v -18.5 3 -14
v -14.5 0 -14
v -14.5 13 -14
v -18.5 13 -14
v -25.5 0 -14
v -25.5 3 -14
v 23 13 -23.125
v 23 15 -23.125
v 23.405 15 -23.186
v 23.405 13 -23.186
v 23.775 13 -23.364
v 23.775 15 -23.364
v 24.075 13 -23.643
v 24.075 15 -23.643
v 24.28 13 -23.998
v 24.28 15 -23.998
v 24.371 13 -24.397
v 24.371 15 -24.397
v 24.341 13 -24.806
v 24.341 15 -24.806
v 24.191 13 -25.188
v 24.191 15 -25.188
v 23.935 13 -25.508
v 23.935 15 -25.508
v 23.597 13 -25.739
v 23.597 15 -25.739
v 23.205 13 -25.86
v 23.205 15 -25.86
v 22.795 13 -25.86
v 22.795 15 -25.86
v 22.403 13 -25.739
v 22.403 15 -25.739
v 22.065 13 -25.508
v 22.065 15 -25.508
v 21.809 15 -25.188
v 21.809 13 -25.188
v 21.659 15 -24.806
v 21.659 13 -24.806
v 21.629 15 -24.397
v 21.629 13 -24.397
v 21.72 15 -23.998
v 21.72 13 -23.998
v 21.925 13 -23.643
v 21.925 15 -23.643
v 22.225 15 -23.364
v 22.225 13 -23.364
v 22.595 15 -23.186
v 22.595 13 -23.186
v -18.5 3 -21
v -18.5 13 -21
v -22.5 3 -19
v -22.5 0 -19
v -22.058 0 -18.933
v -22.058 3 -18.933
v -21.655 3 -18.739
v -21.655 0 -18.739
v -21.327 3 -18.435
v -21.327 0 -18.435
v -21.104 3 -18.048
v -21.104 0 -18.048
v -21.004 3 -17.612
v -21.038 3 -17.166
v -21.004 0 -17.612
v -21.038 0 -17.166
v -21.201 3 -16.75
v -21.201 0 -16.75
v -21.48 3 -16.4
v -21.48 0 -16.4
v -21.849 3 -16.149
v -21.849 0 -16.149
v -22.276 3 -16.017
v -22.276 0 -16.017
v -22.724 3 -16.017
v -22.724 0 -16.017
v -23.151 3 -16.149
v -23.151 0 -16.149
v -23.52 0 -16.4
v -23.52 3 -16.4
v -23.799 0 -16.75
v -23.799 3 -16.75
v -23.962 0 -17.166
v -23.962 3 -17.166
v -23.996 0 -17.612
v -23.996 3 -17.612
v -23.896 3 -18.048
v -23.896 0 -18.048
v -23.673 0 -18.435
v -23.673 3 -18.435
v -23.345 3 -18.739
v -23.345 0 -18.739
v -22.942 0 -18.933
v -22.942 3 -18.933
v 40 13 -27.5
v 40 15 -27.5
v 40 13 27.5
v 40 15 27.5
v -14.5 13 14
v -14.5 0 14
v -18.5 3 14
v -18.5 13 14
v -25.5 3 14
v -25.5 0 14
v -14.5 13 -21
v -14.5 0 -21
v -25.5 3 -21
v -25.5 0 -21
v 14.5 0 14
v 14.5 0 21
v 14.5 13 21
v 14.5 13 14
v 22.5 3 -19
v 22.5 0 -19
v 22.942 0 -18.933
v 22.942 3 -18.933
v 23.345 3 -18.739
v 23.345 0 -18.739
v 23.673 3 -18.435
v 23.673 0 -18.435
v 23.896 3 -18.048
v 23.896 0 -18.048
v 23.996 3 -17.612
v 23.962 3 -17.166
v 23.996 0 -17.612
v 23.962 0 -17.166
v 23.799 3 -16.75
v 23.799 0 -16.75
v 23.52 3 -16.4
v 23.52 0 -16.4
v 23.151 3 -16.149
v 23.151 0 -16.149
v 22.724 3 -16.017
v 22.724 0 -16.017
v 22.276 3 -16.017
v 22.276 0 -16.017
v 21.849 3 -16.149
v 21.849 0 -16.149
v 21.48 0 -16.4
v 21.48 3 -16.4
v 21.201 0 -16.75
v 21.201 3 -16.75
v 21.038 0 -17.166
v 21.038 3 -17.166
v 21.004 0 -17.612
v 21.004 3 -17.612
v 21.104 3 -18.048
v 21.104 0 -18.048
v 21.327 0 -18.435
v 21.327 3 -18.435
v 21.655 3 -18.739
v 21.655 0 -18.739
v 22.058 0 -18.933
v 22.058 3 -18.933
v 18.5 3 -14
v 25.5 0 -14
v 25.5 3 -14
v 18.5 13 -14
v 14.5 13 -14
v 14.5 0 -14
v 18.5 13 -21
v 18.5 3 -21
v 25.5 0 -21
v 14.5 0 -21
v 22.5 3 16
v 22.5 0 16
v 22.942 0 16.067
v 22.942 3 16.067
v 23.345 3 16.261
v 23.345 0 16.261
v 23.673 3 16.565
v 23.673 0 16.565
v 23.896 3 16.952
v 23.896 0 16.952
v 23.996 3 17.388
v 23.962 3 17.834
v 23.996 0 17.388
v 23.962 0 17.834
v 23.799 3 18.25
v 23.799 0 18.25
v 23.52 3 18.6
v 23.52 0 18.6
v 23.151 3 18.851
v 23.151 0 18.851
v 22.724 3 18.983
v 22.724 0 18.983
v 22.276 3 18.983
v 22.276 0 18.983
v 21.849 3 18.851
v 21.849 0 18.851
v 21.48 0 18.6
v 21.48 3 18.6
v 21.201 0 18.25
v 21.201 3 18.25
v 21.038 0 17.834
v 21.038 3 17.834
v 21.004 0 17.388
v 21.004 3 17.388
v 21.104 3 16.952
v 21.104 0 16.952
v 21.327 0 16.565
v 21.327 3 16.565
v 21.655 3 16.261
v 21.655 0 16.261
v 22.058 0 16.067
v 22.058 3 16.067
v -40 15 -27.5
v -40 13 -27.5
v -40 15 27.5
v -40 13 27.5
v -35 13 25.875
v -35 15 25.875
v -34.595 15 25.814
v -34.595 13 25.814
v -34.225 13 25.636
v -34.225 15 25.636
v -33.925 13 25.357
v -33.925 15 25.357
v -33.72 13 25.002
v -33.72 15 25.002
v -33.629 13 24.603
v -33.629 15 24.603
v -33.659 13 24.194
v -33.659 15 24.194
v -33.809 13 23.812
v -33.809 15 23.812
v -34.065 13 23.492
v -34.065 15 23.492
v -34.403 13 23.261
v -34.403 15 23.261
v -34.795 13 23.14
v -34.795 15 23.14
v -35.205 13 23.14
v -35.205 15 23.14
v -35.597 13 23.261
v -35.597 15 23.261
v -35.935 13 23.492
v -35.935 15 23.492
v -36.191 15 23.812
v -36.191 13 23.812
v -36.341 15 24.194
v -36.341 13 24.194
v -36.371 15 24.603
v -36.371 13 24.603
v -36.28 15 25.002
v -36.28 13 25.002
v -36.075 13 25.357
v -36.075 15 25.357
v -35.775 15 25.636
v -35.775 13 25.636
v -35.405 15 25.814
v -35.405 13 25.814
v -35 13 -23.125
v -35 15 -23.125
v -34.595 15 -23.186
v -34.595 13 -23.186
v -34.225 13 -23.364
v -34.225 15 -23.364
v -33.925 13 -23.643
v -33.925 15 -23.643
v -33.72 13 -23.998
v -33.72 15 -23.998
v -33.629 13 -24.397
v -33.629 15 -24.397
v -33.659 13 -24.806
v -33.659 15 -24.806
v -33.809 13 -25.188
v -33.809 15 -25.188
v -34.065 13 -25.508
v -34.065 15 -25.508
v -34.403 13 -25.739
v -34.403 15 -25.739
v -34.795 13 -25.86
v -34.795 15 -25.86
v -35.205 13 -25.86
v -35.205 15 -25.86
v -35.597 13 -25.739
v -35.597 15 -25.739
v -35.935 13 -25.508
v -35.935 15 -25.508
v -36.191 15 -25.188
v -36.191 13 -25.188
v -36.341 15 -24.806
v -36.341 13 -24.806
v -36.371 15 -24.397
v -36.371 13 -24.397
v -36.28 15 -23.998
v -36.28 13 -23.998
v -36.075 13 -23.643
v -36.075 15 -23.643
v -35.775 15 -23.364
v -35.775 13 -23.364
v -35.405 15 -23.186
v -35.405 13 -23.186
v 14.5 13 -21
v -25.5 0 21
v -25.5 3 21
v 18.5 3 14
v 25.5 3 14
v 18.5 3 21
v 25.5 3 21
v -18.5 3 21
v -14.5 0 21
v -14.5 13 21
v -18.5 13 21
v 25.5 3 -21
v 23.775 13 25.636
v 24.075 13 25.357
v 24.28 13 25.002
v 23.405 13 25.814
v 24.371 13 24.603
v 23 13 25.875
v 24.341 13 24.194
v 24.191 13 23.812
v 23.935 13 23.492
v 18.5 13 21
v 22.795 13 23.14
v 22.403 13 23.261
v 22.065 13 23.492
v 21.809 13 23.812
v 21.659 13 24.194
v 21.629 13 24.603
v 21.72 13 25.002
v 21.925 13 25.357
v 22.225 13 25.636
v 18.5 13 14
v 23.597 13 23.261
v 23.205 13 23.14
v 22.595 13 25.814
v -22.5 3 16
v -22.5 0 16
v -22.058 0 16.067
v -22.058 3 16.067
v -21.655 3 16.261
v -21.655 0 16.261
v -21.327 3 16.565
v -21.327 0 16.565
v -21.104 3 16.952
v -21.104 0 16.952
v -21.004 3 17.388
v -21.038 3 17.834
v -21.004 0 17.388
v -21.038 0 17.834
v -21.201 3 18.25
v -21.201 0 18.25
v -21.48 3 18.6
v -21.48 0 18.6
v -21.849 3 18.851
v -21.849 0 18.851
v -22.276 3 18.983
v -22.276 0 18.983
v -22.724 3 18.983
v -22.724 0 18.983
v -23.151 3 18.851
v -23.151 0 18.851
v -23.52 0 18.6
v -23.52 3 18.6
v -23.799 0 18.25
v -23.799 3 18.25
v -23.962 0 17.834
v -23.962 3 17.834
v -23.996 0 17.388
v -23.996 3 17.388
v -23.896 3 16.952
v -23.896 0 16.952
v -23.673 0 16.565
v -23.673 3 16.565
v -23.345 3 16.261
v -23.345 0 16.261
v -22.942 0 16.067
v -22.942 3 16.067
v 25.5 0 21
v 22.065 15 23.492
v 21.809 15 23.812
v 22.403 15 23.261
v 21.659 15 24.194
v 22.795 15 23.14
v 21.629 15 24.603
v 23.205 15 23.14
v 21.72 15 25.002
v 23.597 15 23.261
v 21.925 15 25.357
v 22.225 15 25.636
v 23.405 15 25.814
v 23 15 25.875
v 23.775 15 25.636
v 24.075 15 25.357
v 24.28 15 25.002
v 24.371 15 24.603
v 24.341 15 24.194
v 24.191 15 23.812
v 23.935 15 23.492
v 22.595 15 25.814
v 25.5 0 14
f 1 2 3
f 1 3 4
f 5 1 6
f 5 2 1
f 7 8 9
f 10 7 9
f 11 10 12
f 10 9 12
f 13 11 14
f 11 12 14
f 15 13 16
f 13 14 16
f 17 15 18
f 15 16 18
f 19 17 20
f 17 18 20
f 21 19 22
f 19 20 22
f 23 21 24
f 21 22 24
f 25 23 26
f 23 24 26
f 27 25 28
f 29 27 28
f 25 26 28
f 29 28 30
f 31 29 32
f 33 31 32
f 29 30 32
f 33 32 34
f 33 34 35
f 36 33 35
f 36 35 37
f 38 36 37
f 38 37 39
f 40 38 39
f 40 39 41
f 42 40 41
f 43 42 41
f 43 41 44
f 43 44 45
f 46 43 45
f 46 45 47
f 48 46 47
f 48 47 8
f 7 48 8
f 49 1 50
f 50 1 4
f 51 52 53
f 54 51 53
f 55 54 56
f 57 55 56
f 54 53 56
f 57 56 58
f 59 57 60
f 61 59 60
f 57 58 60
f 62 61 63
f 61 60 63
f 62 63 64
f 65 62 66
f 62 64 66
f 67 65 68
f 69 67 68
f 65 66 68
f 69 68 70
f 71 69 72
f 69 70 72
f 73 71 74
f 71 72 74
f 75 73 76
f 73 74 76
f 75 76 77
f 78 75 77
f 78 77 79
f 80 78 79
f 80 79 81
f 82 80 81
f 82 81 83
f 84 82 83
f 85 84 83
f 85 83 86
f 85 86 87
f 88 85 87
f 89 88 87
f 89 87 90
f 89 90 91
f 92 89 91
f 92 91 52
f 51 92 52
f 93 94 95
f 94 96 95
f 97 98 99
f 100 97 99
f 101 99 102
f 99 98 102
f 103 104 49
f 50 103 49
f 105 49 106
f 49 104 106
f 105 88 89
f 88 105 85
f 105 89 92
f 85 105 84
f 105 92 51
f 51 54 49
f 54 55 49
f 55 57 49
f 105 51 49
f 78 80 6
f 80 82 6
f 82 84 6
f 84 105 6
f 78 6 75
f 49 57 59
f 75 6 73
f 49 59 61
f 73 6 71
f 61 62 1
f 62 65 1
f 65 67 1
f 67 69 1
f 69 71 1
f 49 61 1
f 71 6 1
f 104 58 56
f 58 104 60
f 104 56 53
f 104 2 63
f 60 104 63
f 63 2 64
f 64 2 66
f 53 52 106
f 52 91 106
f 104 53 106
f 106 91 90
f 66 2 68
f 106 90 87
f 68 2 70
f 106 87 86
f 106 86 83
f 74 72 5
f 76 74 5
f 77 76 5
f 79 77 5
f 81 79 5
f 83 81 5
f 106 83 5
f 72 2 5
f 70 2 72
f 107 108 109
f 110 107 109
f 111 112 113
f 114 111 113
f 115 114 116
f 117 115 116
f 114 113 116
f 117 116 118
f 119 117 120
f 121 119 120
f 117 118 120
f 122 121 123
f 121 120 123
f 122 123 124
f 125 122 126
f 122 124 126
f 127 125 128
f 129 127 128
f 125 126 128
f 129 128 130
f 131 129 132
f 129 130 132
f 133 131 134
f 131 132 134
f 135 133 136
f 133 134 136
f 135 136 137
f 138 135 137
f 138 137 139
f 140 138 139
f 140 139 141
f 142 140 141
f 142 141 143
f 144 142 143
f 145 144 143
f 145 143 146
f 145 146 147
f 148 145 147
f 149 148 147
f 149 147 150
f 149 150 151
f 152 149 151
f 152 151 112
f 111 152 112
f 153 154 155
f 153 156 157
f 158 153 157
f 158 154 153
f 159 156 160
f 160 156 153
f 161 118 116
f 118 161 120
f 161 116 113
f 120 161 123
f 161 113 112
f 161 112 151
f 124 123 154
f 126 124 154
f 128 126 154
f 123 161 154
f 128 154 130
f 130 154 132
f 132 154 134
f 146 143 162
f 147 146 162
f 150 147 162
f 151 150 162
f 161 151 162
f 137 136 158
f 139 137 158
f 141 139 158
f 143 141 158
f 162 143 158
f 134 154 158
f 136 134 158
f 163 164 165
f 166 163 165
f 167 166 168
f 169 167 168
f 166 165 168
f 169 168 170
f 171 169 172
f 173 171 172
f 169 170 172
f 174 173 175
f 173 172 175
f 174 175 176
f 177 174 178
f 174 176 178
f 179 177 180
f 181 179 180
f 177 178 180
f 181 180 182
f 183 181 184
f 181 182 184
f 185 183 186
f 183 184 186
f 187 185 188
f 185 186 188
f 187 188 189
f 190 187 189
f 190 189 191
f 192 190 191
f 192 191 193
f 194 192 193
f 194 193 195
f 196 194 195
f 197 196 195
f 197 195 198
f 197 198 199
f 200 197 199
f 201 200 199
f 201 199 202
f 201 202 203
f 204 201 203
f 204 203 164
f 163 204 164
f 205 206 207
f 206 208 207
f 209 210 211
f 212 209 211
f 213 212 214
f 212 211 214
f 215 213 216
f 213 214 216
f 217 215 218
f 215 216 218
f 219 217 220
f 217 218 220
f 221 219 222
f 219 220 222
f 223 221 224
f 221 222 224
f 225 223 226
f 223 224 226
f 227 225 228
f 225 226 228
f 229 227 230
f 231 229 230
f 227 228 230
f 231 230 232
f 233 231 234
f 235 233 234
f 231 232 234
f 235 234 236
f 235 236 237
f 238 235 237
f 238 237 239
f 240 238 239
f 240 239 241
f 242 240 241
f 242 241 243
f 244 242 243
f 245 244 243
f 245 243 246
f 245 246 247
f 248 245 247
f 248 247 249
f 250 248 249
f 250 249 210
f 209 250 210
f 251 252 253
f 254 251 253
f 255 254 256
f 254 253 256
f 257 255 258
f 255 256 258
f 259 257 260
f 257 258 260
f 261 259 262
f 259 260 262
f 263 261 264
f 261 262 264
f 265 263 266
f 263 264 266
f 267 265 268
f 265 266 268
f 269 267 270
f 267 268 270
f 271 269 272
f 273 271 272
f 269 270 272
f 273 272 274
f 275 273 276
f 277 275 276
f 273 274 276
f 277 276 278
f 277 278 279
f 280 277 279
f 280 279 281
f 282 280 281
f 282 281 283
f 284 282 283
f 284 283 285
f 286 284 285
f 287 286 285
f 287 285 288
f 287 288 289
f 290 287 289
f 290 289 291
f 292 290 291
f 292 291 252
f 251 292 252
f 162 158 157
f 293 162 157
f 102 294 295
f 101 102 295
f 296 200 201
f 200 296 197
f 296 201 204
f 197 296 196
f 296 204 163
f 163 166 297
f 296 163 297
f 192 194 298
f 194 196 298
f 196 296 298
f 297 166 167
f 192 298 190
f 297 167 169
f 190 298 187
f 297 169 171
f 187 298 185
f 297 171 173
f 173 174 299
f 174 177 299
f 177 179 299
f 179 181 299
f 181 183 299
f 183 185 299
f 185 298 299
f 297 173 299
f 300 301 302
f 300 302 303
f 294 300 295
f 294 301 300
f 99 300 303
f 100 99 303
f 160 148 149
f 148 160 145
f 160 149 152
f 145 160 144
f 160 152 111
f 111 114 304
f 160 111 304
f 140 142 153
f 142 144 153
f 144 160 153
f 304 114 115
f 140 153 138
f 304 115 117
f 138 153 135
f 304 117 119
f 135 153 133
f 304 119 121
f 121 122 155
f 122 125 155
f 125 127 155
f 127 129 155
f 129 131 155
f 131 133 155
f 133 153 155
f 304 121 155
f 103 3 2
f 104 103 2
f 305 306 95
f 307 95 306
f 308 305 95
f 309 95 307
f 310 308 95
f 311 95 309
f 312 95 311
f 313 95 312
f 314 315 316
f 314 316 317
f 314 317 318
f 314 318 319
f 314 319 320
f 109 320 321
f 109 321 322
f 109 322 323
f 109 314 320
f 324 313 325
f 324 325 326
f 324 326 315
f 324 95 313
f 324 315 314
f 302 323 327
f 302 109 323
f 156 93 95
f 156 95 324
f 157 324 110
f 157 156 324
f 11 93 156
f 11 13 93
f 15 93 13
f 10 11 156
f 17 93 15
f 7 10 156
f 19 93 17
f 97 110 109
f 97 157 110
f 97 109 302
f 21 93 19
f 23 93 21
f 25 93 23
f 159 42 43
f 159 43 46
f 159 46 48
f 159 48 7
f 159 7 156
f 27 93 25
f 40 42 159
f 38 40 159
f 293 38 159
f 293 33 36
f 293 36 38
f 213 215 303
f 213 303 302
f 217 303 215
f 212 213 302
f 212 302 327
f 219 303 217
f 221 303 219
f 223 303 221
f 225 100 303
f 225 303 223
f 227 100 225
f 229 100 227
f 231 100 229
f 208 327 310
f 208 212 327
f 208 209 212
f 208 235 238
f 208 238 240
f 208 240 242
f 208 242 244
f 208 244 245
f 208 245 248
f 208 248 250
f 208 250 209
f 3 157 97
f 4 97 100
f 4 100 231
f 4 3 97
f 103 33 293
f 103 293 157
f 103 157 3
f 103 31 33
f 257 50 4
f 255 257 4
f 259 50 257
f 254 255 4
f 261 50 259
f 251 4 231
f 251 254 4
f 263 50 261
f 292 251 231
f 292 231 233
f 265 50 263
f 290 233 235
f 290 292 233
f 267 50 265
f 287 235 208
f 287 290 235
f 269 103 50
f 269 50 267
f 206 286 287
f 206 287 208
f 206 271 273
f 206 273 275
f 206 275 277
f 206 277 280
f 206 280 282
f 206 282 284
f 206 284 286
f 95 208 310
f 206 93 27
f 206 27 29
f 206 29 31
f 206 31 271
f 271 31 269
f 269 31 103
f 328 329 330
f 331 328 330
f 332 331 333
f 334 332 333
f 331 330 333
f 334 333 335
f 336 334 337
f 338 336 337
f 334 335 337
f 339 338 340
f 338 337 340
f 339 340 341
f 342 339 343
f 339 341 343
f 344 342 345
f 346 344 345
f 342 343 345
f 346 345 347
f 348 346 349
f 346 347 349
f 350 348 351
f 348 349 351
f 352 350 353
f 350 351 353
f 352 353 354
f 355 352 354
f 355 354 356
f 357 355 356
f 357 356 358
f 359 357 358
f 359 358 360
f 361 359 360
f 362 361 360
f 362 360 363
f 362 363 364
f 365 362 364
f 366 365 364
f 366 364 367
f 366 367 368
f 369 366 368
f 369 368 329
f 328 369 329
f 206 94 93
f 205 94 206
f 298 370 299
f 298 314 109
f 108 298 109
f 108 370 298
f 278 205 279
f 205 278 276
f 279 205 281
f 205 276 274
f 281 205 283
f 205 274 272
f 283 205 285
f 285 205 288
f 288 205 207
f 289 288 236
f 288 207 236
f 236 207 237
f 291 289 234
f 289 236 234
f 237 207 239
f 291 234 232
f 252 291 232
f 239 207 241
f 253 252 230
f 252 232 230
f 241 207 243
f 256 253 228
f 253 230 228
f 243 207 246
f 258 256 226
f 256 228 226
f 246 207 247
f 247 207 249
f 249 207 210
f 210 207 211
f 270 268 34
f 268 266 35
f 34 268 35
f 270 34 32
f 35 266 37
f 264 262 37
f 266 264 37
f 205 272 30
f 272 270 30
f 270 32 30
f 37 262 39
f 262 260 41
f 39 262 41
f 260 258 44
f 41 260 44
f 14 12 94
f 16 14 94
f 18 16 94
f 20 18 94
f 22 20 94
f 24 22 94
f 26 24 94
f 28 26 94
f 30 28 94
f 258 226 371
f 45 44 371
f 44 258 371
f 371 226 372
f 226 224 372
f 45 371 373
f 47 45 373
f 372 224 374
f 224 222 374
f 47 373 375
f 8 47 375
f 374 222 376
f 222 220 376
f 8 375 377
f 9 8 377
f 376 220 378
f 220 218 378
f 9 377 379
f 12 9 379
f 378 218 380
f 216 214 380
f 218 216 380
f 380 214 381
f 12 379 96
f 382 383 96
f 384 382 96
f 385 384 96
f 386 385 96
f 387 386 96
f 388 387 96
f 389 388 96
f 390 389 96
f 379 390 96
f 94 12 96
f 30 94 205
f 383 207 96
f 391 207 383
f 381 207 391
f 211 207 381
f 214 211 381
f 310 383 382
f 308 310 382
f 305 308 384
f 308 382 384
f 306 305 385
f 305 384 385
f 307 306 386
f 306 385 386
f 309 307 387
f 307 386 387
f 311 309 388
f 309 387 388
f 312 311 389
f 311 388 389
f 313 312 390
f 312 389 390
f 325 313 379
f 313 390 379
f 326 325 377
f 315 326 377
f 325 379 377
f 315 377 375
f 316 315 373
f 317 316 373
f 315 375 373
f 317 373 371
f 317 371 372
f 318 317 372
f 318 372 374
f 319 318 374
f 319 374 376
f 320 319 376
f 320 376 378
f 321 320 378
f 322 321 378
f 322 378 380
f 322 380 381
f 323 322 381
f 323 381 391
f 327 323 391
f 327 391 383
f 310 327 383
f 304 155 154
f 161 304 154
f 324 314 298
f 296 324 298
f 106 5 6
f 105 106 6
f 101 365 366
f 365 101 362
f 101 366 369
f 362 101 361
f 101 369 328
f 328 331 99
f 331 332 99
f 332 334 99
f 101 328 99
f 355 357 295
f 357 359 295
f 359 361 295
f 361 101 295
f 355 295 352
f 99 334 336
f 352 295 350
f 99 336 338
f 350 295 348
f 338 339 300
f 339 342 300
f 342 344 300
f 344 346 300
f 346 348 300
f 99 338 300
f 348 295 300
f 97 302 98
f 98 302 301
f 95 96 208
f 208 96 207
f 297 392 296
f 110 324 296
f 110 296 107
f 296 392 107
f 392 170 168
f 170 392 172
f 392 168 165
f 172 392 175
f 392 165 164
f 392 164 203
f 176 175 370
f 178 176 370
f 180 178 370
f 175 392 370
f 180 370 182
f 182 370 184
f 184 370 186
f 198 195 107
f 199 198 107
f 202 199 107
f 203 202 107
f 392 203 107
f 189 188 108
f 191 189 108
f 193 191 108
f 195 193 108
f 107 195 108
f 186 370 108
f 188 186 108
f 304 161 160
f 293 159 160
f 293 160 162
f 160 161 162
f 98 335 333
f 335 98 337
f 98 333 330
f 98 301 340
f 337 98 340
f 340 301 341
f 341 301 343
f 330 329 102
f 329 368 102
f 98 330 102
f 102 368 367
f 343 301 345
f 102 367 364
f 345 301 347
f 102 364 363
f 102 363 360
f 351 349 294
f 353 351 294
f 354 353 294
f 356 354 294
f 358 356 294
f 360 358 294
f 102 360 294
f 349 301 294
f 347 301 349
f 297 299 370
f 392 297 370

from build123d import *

# Parameters (mm, degrees)
EXTRUDE_1_DEPTH     = 27.5
CUT_EXTRUDE_1_REACH = 52.806
SKETCH_4_R          = 1.5
CUT_EXTRUDE_2_REACH = 52.806
SKETCH_5_W          = 51
SKETCH_5_H          = 6.5
SKETCH_5_H_2        = 28
CUT_EXTRUDE_3_REACH = 52.806
SKETCH_6_R          = 1.375


with BuildPart() as part:
    # 草圖1 → 填料-伸長1 (new, symmetric)
    with BuildSketch(Plane.XY):
        Polygon((-25.5, 0), (-25.5, 3), (-18.5, 3), (-18.5, 13), (-40, 13), (-40, 15), (40, 15), (40, 13), (18.5, 13), (18.5, 3), (25.5, 3), (25.5, 0), (14.5, 0), (14.5, 13), (-14.5, 13), (-14.5, 0), align=None)
    extrude(amount=EXTRUDE_1_DEPTH, both=True)

    # 草圖4 → 除料-伸長1 (cut, up to next)
    with BuildSketch(Plane(origin=(0, 0, 0), x_dir=(-1, 0, 0), z_dir=(0, -1, 0)), mode=Mode.PRIVATE) as cut_extrude_1_sk1:
        with Locations(Location((-22.5, 17.5, 0), (0, 0, 90))):
            Circle(SKETCH_4_R)
    cut_extrude_1_tool1 = extrude(cut_extrude_1_sk1.sketch, amount=-CUT_EXTRUDE_1_REACH, mode=Mode.PRIVATE) & part.part
    # 草圖4 → 除料-伸長1 (cut, up to next)
    with BuildSketch(Plane(origin=(0, 0, 0), x_dir=(-1, 0, 0), z_dir=(0, -1, 0)), mode=Mode.PRIVATE) as cut_extrude_1_sk2:
        with Locations(Location((-22.5, -17.5, 0), (0, 0, 90))):
            Circle(SKETCH_4_R)
    cut_extrude_1_tool2 = extrude(cut_extrude_1_sk2.sketch, amount=-CUT_EXTRUDE_1_REACH, mode=Mode.PRIVATE) & part.part
    # 草圖4 → 除料-伸長1 (cut, up to next)
    with BuildSketch(Plane(origin=(0, 0, 0), x_dir=(-1, 0, 0), z_dir=(0, -1, 0)), mode=Mode.PRIVATE) as cut_extrude_1_sk3:
        with Locations(Location((22.5, -17.5, 0), (0, 0, 90))):
            Circle(SKETCH_4_R)
    cut_extrude_1_tool3 = extrude(cut_extrude_1_sk3.sketch, amount=-CUT_EXTRUDE_1_REACH, mode=Mode.PRIVATE) & part.part
    # 草圖4 → 除料-伸長1 (cut, up to next)
    with BuildSketch(Plane(origin=(0, 0, 0), x_dir=(-1, 0, 0), z_dir=(0, -1, 0)), mode=Mode.PRIVATE) as cut_extrude_1_sk4:
        with Locations(Location((22.5, 17.5, 0), (0, 0, 90))):
            Circle(SKETCH_4_R)
    cut_extrude_1_tool4 = extrude(cut_extrude_1_sk4.sketch, amount=-CUT_EXTRUDE_1_REACH, mode=Mode.PRIVATE) & part.part
    add(cut_extrude_1_tool1.solids().sort_by_distance((22.5, 0, -17.5))[0], mode=Mode.SUBTRACT)
    add(cut_extrude_1_tool2.solids().sort_by_distance((22.5, 0, 17.5))[0], mode=Mode.SUBTRACT)
    add(cut_extrude_1_tool3.solids().sort_by_distance((-22.5, 0, 17.5))[0], mode=Mode.SUBTRACT)
    add(cut_extrude_1_tool4.solids().sort_by_distance((-22.5, 0, -17.5))[0], mode=Mode.SUBTRACT)

    # 除料-伸長2: up to this face of the body (flat: up to its plane)
    cut_extrude_2_end = Plane(part.part.faces().sort_by_distance((0, 13, 0))[0])
    # 草圖5 → 除料-伸長2 (cut, up to the picked face)
    with BuildSketch(Plane(origin=(0, 0, 0), x_dir=(-1, 0, 0), z_dir=(0, -1, 0)), mode=Mode.PRIVATE) as cut_extrude_2_sk1:
        with Locations((0, 24.25)):
            Rectangle(SKETCH_5_W, SKETCH_5_H)
    cut_extrude_2_tool1 = split(extrude(cut_extrude_2_sk1.sketch, amount=-CUT_EXTRUDE_2_REACH, mode=Mode.PRIVATE), bisect_by=cut_extrude_2_end, keep=Keep.BOTH, mode=Mode.PRIVATE)
    # 草圖5 → 除料-伸長2 (cut, up to the picked face)
    with BuildSketch(Plane(origin=(0, 0, 0), x_dir=(-1, 0, 0), z_dir=(0, -1, 0)), mode=Mode.PRIVATE) as cut_extrude_2_sk2:
        Rectangle(SKETCH_5_W, SKETCH_5_H_2)
    cut_extrude_2_tool2 = split(extrude(cut_extrude_2_sk2.sketch, amount=-CUT_EXTRUDE_2_REACH, mode=Mode.PRIVATE), bisect_by=cut_extrude_2_end, keep=Keep.BOTH, mode=Mode.PRIVATE)
    # 草圖5 → 除料-伸長2 (cut, up to the picked face)
    with BuildSketch(Plane(origin=(0, 0, 0), x_dir=(-1, 0, 0), z_dir=(0, -1, 0)), mode=Mode.PRIVATE) as cut_extrude_2_sk3:
        with Locations((0, -24.25)):
            Rectangle(SKETCH_5_W, SKETCH_5_H)
    cut_extrude_2_tool3 = split(extrude(cut_extrude_2_sk3.sketch, amount=-CUT_EXTRUDE_2_REACH, mode=Mode.PRIVATE), bisect_by=cut_extrude_2_end, keep=Keep.BOTH, mode=Mode.PRIVATE)
    add(cut_extrude_2_tool1.solids().sort_by(Axis((0, 0, -24.25), (0, 1, 0)))[0], mode=Mode.SUBTRACT)
    add(cut_extrude_2_tool2.solids().sort_by(Axis((0, 0, 0), (0, 1, 0)))[0], mode=Mode.SUBTRACT)
    add(cut_extrude_2_tool3.solids().sort_by(Axis((0, 0, 24.25), (0, 1, 0)))[0], mode=Mode.SUBTRACT)

    # 草圖6 → 除料-伸長3 (cut, up to next)
    with BuildSketch(Plane(origin=(0, 15, 0), x_dir=(1, 0, 0), z_dir=(0, 1, 0)), mode=Mode.PRIVATE) as cut_extrude_3_sk1:
        with Locations(Location((-35, 24.5, 0), (0, 0, 270))):
            Circle(SKETCH_6_R)
    cut_extrude_3_tool1 = extrude(cut_extrude_3_sk1.sketch, amount=-CUT_EXTRUDE_3_REACH, mode=Mode.PRIVATE) & part.part
    # 草圖6 → 除料-伸長3 (cut, up to next)
    with BuildSketch(Plane(origin=(0, 15, 0), x_dir=(1, 0, 0), z_dir=(0, 1, 0)), mode=Mode.PRIVATE) as cut_extrude_3_sk2:
        with Locations(Location((-35, -24.5, 0), (0, 0, 270))):
            Circle(SKETCH_6_R)
    cut_extrude_3_tool2 = extrude(cut_extrude_3_sk2.sketch, amount=-CUT_EXTRUDE_3_REACH, mode=Mode.PRIVATE) & part.part
    # 草圖6 → 除料-伸長3 (cut, up to next)
    with BuildSketch(Plane(origin=(0, 15, 0), x_dir=(1, 0, 0), z_dir=(0, 1, 0)), mode=Mode.PRIVATE) as cut_extrude_3_sk3:
        with Locations(Location((23, -24.5, 0), (0, 0, 270))):
            Circle(SKETCH_6_R)
    cut_extrude_3_tool3 = extrude(cut_extrude_3_sk3.sketch, amount=-CUT_EXTRUDE_3_REACH, mode=Mode.PRIVATE) & part.part
    # 草圖6 → 除料-伸長3 (cut, up to next)
    with BuildSketch(Plane(origin=(0, 15, 0), x_dir=(1, 0, 0), z_dir=(0, 1, 0)), mode=Mode.PRIVATE) as cut_extrude_3_sk4:
        with Locations(Location((23, 24.5, 0), (0, 0, 270))):
            Circle(SKETCH_6_R)
    cut_extrude_3_tool4 = extrude(cut_extrude_3_sk4.sketch, amount=-CUT_EXTRUDE_3_REACH, mode=Mode.PRIVATE) & part.part
    add(cut_extrude_3_tool1.solids().sort_by_distance((-35, 15, -24.5))[0], mode=Mode.SUBTRACT)
    add(cut_extrude_3_tool2.solids().sort_by_distance((-35, 15, 24.5))[0], mode=Mode.SUBTRACT)
    add(cut_extrude_3_tool3.solids().sort_by_distance((23, 15, 24.5))[0], mode=Mode.SUBTRACT)
    add(cut_extrude_3_tool4.solids().sort_by_distance((23, 15, -24.5))[0], mode=Mode.SUBTRACT)


solid = part.part
